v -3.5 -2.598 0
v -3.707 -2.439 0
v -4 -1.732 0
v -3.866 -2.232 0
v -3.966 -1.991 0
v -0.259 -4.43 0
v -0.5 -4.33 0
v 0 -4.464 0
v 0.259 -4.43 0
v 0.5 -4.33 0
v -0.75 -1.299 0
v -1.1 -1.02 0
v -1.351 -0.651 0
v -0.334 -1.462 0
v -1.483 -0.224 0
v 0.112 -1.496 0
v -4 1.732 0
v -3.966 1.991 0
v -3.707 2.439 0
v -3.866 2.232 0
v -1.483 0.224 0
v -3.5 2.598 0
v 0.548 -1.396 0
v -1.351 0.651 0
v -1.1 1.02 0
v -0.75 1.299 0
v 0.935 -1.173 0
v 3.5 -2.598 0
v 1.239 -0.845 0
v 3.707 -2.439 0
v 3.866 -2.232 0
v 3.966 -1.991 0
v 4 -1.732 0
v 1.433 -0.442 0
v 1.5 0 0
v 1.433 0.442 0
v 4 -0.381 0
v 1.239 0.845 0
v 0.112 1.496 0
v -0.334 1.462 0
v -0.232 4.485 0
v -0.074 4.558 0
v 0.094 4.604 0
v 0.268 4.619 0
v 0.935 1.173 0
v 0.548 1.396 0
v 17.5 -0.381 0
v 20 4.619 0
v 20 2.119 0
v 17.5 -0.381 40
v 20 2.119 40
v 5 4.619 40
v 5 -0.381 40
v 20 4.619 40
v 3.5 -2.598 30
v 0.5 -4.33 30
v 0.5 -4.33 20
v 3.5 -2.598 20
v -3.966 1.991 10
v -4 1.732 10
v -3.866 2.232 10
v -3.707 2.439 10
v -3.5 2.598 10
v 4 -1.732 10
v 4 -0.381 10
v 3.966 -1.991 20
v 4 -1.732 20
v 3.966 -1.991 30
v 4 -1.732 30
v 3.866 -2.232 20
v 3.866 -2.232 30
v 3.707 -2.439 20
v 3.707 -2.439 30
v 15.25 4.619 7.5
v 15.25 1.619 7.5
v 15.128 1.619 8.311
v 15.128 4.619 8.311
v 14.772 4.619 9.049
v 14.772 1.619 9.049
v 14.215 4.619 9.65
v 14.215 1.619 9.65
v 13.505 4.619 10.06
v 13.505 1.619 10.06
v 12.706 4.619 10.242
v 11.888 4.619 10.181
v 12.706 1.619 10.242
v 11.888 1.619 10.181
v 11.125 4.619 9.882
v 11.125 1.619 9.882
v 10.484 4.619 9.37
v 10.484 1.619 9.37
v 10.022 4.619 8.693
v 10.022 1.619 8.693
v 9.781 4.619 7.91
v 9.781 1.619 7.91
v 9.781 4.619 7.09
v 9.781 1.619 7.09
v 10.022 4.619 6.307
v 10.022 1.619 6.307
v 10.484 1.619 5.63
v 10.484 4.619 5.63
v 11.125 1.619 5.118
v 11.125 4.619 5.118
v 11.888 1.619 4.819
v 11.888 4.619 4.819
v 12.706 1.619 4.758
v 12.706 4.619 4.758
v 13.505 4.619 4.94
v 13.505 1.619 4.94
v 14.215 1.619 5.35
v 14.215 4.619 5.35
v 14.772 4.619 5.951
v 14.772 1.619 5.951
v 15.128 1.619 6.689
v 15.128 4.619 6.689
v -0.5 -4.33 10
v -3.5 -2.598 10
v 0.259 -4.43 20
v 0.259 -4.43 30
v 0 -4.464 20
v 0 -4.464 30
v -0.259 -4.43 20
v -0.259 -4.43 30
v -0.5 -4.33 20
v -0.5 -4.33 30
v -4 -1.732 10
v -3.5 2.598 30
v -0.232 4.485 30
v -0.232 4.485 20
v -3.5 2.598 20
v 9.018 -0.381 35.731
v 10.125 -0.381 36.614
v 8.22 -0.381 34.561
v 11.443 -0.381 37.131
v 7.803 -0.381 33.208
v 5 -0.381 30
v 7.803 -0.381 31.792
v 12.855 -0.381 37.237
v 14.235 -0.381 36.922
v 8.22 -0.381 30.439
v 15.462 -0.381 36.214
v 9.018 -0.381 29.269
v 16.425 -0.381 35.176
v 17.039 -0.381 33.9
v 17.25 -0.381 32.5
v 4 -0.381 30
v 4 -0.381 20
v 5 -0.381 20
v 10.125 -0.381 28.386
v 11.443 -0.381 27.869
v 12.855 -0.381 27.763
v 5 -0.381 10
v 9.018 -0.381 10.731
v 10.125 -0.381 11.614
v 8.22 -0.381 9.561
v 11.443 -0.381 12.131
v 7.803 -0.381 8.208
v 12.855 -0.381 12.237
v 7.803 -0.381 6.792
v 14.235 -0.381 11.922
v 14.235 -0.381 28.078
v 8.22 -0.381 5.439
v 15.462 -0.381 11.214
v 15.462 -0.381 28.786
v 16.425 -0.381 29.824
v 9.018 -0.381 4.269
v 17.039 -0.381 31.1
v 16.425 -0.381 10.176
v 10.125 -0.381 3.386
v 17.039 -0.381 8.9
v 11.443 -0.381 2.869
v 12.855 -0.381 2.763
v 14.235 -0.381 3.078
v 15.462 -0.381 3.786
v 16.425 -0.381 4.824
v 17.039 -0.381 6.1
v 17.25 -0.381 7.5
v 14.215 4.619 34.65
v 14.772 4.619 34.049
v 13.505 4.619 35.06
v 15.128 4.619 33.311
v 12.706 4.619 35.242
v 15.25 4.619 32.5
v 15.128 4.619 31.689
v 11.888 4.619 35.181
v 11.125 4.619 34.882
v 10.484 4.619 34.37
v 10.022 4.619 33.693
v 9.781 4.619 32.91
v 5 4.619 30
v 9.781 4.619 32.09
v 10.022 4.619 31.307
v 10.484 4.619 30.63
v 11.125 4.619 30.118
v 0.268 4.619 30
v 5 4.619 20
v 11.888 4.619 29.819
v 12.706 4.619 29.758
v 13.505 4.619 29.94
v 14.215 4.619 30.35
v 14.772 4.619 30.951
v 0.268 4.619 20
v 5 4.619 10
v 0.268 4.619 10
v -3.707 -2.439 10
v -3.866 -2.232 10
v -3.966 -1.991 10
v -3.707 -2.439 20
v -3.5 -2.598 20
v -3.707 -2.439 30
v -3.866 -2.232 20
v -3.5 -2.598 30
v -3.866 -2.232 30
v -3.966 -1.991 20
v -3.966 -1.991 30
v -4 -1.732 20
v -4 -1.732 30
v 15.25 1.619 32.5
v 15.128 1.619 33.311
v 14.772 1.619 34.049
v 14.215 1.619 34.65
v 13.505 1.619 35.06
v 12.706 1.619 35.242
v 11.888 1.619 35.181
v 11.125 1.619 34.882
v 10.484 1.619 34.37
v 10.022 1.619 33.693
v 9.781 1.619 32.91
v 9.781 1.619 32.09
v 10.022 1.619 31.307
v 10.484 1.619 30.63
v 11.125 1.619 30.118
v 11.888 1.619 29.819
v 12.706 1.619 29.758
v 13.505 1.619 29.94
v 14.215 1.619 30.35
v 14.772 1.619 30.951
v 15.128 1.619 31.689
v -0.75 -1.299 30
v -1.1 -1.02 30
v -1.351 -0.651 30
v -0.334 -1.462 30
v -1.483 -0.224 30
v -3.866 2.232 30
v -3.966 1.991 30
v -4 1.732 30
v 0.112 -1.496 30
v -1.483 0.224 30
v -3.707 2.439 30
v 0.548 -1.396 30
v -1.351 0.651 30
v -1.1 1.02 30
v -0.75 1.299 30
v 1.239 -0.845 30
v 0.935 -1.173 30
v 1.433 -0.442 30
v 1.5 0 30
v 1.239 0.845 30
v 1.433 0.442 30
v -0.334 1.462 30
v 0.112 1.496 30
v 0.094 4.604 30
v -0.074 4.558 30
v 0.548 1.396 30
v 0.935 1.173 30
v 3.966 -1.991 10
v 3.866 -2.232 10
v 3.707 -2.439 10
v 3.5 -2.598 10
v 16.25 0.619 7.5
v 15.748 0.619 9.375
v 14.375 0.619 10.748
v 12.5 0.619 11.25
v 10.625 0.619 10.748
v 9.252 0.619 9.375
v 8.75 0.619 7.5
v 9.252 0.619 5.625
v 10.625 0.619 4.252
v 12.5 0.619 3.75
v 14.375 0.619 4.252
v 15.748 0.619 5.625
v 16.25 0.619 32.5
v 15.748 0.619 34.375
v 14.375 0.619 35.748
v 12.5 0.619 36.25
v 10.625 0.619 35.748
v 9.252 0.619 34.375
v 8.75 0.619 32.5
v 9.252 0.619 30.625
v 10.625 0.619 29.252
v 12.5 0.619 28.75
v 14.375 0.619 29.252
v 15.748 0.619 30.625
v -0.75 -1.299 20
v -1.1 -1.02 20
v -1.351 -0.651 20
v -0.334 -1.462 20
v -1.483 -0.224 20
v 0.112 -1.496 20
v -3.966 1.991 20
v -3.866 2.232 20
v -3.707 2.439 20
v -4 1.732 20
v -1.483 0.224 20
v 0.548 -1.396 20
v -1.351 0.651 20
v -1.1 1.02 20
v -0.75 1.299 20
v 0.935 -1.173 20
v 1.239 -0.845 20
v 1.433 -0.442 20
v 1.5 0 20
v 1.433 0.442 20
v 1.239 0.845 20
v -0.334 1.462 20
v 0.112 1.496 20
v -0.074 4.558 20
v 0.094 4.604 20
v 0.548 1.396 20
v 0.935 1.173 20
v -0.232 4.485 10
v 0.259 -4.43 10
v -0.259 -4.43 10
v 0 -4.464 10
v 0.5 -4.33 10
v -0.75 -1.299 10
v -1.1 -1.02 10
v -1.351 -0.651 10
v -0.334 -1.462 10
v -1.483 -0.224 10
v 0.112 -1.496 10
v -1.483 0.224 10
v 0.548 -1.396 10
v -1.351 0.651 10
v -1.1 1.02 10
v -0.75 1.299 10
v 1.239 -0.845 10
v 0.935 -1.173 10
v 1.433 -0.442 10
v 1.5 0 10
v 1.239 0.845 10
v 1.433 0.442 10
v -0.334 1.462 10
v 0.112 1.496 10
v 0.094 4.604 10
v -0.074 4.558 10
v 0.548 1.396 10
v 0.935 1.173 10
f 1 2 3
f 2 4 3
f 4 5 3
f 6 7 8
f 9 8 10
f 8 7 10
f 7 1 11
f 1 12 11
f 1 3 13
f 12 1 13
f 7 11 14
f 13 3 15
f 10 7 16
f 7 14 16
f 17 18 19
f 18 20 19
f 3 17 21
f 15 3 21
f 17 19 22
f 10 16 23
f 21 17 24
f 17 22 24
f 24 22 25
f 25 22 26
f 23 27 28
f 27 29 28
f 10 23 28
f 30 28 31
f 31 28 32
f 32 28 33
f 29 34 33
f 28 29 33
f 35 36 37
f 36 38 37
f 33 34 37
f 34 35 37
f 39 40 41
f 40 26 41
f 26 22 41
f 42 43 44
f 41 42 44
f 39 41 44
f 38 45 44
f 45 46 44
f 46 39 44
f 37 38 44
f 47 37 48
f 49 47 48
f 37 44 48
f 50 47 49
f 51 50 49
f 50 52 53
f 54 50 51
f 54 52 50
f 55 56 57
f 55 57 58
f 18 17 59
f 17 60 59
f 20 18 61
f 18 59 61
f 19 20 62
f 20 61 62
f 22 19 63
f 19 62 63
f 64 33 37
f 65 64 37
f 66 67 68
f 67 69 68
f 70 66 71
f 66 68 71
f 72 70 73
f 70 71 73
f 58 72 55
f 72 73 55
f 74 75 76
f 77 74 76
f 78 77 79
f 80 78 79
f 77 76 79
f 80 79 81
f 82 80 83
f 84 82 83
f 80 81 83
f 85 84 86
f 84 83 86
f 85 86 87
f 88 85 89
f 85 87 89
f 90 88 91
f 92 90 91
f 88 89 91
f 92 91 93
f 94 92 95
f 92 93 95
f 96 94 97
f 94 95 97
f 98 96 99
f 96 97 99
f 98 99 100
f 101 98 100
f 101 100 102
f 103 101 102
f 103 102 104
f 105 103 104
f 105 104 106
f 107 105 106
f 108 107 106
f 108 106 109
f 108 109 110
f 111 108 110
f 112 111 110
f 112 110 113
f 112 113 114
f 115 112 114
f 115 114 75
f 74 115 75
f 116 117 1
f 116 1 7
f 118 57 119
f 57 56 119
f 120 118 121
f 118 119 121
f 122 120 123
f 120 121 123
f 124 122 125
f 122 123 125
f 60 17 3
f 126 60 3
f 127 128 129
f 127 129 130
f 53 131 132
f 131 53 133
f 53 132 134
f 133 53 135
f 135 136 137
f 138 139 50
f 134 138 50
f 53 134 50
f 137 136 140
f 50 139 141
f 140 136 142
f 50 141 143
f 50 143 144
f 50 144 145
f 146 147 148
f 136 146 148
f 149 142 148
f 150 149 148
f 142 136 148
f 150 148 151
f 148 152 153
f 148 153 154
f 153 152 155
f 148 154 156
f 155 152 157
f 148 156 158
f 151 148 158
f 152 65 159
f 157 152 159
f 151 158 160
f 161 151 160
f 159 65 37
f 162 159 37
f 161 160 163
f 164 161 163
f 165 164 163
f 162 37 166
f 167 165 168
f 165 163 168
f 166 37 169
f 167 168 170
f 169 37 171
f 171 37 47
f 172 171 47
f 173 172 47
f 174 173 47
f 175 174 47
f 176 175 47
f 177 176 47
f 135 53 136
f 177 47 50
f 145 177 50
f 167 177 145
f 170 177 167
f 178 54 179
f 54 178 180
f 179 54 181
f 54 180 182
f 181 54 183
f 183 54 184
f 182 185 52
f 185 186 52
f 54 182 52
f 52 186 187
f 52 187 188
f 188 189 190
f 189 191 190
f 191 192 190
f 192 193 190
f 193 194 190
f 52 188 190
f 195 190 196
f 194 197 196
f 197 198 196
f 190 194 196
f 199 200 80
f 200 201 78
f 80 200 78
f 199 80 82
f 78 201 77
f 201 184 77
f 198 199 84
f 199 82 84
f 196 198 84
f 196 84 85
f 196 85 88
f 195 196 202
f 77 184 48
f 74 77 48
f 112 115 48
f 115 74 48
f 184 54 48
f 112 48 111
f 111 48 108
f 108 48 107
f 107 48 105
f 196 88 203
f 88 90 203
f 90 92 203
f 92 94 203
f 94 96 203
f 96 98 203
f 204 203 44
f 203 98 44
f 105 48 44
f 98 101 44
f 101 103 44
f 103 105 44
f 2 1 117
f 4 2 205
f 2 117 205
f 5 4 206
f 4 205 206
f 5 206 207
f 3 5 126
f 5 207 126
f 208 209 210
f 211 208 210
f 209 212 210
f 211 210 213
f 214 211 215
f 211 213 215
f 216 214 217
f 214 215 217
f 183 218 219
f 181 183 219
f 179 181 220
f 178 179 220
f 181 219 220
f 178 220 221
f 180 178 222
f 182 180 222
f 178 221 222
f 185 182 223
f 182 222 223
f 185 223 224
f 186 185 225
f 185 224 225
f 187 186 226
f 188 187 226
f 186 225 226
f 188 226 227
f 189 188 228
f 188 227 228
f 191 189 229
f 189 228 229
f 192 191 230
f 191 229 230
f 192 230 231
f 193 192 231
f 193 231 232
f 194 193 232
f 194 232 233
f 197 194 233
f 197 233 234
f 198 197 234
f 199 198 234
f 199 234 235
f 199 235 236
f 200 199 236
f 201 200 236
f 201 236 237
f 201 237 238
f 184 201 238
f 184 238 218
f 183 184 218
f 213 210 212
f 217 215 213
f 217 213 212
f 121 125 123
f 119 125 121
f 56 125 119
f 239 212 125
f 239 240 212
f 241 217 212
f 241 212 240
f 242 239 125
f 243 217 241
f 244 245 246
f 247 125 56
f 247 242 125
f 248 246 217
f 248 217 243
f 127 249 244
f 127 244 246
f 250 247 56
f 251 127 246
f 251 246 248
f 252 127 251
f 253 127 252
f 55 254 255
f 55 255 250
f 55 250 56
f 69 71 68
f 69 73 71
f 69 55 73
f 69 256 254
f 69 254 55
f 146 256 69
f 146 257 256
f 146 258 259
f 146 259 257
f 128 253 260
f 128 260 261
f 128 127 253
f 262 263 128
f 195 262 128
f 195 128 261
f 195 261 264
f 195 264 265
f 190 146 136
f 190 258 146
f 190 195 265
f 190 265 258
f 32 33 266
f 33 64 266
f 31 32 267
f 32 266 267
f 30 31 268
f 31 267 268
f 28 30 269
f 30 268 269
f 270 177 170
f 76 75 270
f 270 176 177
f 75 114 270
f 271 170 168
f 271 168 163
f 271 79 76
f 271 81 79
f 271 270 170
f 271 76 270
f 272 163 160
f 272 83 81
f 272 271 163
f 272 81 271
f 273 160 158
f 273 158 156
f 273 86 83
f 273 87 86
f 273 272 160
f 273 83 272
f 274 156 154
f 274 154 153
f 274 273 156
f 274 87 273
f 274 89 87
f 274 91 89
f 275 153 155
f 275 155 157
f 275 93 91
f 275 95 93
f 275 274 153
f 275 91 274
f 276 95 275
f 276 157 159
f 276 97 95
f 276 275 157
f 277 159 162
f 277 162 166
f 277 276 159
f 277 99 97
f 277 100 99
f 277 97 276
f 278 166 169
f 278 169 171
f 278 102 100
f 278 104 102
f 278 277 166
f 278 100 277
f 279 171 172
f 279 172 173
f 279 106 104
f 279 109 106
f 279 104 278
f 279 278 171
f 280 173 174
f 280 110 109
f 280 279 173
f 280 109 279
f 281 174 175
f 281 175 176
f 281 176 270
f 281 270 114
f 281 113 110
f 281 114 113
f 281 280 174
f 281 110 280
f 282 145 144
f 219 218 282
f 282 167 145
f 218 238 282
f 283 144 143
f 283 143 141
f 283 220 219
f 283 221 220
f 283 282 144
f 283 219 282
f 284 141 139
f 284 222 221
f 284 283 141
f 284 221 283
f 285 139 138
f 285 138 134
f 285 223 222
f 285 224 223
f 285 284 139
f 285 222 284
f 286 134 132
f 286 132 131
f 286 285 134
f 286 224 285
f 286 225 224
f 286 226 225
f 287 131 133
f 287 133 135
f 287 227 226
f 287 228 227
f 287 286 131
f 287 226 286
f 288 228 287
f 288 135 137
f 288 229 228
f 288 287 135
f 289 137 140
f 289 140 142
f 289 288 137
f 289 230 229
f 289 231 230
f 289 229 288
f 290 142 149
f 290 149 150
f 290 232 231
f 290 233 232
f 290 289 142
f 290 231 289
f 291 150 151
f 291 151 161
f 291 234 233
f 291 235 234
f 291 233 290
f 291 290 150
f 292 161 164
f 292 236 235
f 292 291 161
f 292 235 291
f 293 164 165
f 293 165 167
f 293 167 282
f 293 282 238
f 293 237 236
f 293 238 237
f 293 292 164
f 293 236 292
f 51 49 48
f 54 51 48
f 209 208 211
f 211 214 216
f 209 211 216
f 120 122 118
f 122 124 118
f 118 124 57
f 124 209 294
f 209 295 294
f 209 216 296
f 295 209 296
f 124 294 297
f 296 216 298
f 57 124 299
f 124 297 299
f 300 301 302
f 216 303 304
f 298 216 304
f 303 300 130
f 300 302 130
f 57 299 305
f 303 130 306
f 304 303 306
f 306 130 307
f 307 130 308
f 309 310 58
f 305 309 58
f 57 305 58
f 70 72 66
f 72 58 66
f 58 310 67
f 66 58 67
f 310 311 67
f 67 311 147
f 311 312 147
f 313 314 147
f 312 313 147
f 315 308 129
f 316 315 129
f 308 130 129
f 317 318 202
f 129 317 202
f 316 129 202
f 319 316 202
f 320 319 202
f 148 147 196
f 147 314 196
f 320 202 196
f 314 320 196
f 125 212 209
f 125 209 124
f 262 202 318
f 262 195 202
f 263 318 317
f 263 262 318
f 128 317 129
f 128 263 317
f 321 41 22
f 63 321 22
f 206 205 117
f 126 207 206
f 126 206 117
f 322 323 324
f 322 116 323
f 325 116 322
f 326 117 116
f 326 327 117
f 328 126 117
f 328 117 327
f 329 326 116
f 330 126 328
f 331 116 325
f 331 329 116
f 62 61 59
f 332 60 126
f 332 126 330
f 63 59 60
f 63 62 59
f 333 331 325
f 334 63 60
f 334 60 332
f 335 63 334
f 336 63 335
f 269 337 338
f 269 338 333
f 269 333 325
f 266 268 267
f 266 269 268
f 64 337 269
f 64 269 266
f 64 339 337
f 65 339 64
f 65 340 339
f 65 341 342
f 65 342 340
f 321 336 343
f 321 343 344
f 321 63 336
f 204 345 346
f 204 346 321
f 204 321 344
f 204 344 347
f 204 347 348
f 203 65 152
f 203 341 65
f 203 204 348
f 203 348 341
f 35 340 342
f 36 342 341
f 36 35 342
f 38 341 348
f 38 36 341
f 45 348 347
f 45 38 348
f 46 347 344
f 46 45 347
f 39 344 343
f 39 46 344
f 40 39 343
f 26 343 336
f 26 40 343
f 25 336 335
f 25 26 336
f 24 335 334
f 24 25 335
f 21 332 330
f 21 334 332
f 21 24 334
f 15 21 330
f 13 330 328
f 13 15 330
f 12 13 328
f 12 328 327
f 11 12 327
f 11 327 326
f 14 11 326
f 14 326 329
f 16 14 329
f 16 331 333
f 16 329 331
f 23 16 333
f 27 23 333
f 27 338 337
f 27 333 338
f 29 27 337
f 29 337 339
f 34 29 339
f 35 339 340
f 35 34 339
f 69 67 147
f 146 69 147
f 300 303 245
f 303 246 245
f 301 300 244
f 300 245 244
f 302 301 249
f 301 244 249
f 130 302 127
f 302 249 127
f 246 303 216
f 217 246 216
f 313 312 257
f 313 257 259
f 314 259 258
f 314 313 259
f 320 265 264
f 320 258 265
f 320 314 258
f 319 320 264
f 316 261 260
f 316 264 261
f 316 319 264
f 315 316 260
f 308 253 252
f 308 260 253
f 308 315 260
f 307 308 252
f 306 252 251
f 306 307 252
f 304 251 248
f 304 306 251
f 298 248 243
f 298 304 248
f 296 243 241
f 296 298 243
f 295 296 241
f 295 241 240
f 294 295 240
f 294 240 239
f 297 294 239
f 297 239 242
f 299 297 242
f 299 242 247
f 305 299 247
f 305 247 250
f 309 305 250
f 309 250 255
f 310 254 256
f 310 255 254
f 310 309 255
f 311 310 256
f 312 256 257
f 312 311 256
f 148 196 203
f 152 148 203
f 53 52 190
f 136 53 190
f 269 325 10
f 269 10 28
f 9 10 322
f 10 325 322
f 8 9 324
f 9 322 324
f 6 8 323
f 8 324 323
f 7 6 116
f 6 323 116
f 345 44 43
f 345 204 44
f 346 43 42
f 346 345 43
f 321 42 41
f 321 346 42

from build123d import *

# Parameters (mm, degrees)
SKETCH1_R      = 1.5
EXTRUDE1_DEPTH = 40
SKETCH2_R      = 2.75
EXTRUDE2_DEPTH = 10
CHAMFER1_SIZE  = 2
SKETCH3_W      = 12.733635698
SKETCH3_H      = 10
SKETCH3_W_2    = 13.399455213
EXTRUDE3_DEPTH = 10
FILLET1_R      = 1


with BuildPart() as part:
    # Sketch1 → Extrude1 (new body)
    with BuildSketch(Plane.XY):
        Polygon((4, -0.381197846), (17.5, -0.381197846), (20, 2.118802154), (20, 4.618802154), (0, 4.618802154), (-4, 2.309401077), (-4, -2.309401077), (0, -4.618802154), (4, -2.309401077), align=None)
        Circle(SKETCH1_R, mode=Mode.SUBTRACT)
    extrude(amount=EXTRUDE1_DEPTH)

    # Sketch2 → Extrude2 (cut)
    with BuildSketch(Plane.XZ.offset(0.381197846)):
        with Locations((12.5, 32.5)):
            Circle(SKETCH2_R)
        with Locations((12.5, 7.5)):
            Circle(SKETCH2_R)
    extrude(amount=-EXTRUDE2_DEPTH, mode=Mode.SUBTRACT)

    # Chamfer1
    chamfer1_edges = [part.edges().sort_by_distance(p)[0] for p in [
        (9.75, -0.381197846, 32.5),
        (9.75, -0.381197846, 7.5),
    ]]
    chamfer(chamfer1_edges, length=CHAMFER1_SIZE)

    # Sketch3 → Extrude3 (cut)
    with BuildSketch(Plane(origin=(0, 4.618802154, 0), x_dir=(1, 0, 0), z_dir=(0, 1, 0))):
        with Locations((-1.366817849, -35)):
            Rectangle(SKETCH3_W, SKETCH3_H)
        with Locations((-1.699727607, -15)):
            Rectangle(SKETCH3_W_2, SKETCH3_H)
    extrude(amount=-EXTRUDE3_DEPTH, mode=Mode.SUBTRACT)

    # Fillet1
    fillet1_edges = [part.edges().sort_by_distance(p)[0] for p in [
        (4, -2.309401077, 25),
        (4, -2.309401077, 5),
        (0, -4.618802154, 25),
        (0, -4.618802154, 5),
        (-4, -2.309401077, 25),
        (-4, -2.309401077, 5),
        (-4, 2.309401077, 25),
        (-4, 2.309401077, 5),
        (0, 4.618802154, 25),
        (0, 4.618802154, 5),
    ]]
    fillet(fillet1_edges, radius=FILLET1_R)


solid = part.part
